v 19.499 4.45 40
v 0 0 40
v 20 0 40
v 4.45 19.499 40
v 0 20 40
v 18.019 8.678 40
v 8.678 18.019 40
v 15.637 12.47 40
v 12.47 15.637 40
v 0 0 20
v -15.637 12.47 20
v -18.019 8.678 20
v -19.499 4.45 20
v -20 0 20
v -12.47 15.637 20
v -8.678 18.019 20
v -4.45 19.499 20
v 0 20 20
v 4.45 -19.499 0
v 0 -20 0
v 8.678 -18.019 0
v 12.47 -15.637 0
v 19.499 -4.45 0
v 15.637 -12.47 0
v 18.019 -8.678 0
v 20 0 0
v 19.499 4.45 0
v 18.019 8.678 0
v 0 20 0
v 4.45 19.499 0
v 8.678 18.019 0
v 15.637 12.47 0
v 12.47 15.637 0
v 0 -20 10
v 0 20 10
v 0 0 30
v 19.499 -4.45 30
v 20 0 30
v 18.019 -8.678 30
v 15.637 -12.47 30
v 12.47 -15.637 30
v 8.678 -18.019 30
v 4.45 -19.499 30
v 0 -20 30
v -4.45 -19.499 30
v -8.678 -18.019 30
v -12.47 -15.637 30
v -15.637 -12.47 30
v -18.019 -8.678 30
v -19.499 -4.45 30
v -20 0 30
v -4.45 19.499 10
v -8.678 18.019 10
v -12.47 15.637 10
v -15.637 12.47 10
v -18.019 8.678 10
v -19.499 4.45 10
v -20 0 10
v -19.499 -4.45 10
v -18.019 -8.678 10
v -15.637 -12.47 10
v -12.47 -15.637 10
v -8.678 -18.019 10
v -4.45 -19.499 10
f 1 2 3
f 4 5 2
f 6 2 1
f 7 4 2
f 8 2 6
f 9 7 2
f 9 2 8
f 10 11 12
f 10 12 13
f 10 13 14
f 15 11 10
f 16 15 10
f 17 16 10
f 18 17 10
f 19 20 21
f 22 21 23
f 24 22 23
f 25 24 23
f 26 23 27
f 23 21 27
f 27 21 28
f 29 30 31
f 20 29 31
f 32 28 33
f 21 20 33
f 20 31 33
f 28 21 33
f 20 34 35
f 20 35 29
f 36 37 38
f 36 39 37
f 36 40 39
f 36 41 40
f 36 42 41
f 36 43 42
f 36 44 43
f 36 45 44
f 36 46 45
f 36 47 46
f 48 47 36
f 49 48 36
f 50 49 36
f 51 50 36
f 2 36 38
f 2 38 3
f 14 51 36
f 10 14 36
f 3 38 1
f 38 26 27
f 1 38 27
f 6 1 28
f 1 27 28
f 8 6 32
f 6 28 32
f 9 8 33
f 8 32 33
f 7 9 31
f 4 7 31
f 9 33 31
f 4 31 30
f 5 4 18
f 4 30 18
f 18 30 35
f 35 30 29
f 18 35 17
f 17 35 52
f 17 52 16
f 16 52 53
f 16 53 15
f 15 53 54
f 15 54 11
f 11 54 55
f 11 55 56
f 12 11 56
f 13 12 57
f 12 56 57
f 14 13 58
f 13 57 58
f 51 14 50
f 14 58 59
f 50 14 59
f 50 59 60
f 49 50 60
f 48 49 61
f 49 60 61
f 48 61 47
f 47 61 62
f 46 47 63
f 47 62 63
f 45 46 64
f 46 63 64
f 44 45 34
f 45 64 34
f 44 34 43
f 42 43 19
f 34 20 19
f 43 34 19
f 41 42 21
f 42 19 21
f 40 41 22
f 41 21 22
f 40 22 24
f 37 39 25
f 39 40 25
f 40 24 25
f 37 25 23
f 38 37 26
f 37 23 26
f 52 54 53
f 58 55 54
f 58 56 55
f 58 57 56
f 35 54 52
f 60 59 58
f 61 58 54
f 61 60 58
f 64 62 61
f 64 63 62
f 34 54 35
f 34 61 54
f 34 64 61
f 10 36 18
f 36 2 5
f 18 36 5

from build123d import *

# Parameters (mm, degrees)
SKETCH1_R               = 20
BOSS_EXTRUDE1_DEPTH     = 40
SKETCH2_W               = 20
SKETCH2_H               = 10
CUT_EXTRUDE1_DEPTH      = 40
CUT_EXTRUDE1_DEPTH_BACK = 40
SKETCH3_W               = 10
SKETCH3_H               = 20
CUT_EXTRUDE2_DEPTH      = 40
CUT_EXTRUDE3_DEPTH      = 10


with BuildPart() as part:
    # Sketch1 → Boss-Extrude1 (new body)
    with BuildSketch(Plane.XY):
        Circle(SKETCH1_R)
    extrude(amount=BOSS_EXTRUDE1_DEPTH)

    # Sketch2 → Cut-Extrude1 (cut, two sides)
    with BuildSketch(Plane(origin=(0, 0, 0), x_dir=(1, 0, 0), z_dir=(0, 1, 0))) as cut_extrude1_sk:
        with Locations((-10, -5)):
            Rectangle(SKETCH2_W, SKETCH2_H)
        with Locations((-10, -35)):
            Rectangle(SKETCH2_W, SKETCH2_H)
    extrude(amount=CUT_EXTRUDE1_DEPTH, mode=Mode.SUBTRACT)
    extrude(cut_extrude1_sk.sketch, amount=-CUT_EXTRUDE1_DEPTH_BACK, mode=Mode.SUBTRACT)

    # Sketch3 → Cut-Extrude2 (cut)
    with BuildSketch(Plane.ZY):
        with Locations((35, -10)):
            Rectangle(SKETCH3_W, SKETCH3_H)
    extrude(amount=-CUT_EXTRUDE2_DEPTH, mode=Mode.SUBTRACT)

    # Sketch4 → Cut-Extrude3 (cut)
    with BuildSketch(Plane.XY.offset(30)):
        with BuildLine():
            Line((-20, 0), (0, 0))
            Line((0, 0), (0, 20))
            ThreePointArc((0, 20), (-14.142135624, 14.142135624), (-20, 0))
        make_face()
    extrude(amount=-CUT_EXTRUDE3_DEPTH, mode=Mode.SUBTRACT)


solid = part.part
